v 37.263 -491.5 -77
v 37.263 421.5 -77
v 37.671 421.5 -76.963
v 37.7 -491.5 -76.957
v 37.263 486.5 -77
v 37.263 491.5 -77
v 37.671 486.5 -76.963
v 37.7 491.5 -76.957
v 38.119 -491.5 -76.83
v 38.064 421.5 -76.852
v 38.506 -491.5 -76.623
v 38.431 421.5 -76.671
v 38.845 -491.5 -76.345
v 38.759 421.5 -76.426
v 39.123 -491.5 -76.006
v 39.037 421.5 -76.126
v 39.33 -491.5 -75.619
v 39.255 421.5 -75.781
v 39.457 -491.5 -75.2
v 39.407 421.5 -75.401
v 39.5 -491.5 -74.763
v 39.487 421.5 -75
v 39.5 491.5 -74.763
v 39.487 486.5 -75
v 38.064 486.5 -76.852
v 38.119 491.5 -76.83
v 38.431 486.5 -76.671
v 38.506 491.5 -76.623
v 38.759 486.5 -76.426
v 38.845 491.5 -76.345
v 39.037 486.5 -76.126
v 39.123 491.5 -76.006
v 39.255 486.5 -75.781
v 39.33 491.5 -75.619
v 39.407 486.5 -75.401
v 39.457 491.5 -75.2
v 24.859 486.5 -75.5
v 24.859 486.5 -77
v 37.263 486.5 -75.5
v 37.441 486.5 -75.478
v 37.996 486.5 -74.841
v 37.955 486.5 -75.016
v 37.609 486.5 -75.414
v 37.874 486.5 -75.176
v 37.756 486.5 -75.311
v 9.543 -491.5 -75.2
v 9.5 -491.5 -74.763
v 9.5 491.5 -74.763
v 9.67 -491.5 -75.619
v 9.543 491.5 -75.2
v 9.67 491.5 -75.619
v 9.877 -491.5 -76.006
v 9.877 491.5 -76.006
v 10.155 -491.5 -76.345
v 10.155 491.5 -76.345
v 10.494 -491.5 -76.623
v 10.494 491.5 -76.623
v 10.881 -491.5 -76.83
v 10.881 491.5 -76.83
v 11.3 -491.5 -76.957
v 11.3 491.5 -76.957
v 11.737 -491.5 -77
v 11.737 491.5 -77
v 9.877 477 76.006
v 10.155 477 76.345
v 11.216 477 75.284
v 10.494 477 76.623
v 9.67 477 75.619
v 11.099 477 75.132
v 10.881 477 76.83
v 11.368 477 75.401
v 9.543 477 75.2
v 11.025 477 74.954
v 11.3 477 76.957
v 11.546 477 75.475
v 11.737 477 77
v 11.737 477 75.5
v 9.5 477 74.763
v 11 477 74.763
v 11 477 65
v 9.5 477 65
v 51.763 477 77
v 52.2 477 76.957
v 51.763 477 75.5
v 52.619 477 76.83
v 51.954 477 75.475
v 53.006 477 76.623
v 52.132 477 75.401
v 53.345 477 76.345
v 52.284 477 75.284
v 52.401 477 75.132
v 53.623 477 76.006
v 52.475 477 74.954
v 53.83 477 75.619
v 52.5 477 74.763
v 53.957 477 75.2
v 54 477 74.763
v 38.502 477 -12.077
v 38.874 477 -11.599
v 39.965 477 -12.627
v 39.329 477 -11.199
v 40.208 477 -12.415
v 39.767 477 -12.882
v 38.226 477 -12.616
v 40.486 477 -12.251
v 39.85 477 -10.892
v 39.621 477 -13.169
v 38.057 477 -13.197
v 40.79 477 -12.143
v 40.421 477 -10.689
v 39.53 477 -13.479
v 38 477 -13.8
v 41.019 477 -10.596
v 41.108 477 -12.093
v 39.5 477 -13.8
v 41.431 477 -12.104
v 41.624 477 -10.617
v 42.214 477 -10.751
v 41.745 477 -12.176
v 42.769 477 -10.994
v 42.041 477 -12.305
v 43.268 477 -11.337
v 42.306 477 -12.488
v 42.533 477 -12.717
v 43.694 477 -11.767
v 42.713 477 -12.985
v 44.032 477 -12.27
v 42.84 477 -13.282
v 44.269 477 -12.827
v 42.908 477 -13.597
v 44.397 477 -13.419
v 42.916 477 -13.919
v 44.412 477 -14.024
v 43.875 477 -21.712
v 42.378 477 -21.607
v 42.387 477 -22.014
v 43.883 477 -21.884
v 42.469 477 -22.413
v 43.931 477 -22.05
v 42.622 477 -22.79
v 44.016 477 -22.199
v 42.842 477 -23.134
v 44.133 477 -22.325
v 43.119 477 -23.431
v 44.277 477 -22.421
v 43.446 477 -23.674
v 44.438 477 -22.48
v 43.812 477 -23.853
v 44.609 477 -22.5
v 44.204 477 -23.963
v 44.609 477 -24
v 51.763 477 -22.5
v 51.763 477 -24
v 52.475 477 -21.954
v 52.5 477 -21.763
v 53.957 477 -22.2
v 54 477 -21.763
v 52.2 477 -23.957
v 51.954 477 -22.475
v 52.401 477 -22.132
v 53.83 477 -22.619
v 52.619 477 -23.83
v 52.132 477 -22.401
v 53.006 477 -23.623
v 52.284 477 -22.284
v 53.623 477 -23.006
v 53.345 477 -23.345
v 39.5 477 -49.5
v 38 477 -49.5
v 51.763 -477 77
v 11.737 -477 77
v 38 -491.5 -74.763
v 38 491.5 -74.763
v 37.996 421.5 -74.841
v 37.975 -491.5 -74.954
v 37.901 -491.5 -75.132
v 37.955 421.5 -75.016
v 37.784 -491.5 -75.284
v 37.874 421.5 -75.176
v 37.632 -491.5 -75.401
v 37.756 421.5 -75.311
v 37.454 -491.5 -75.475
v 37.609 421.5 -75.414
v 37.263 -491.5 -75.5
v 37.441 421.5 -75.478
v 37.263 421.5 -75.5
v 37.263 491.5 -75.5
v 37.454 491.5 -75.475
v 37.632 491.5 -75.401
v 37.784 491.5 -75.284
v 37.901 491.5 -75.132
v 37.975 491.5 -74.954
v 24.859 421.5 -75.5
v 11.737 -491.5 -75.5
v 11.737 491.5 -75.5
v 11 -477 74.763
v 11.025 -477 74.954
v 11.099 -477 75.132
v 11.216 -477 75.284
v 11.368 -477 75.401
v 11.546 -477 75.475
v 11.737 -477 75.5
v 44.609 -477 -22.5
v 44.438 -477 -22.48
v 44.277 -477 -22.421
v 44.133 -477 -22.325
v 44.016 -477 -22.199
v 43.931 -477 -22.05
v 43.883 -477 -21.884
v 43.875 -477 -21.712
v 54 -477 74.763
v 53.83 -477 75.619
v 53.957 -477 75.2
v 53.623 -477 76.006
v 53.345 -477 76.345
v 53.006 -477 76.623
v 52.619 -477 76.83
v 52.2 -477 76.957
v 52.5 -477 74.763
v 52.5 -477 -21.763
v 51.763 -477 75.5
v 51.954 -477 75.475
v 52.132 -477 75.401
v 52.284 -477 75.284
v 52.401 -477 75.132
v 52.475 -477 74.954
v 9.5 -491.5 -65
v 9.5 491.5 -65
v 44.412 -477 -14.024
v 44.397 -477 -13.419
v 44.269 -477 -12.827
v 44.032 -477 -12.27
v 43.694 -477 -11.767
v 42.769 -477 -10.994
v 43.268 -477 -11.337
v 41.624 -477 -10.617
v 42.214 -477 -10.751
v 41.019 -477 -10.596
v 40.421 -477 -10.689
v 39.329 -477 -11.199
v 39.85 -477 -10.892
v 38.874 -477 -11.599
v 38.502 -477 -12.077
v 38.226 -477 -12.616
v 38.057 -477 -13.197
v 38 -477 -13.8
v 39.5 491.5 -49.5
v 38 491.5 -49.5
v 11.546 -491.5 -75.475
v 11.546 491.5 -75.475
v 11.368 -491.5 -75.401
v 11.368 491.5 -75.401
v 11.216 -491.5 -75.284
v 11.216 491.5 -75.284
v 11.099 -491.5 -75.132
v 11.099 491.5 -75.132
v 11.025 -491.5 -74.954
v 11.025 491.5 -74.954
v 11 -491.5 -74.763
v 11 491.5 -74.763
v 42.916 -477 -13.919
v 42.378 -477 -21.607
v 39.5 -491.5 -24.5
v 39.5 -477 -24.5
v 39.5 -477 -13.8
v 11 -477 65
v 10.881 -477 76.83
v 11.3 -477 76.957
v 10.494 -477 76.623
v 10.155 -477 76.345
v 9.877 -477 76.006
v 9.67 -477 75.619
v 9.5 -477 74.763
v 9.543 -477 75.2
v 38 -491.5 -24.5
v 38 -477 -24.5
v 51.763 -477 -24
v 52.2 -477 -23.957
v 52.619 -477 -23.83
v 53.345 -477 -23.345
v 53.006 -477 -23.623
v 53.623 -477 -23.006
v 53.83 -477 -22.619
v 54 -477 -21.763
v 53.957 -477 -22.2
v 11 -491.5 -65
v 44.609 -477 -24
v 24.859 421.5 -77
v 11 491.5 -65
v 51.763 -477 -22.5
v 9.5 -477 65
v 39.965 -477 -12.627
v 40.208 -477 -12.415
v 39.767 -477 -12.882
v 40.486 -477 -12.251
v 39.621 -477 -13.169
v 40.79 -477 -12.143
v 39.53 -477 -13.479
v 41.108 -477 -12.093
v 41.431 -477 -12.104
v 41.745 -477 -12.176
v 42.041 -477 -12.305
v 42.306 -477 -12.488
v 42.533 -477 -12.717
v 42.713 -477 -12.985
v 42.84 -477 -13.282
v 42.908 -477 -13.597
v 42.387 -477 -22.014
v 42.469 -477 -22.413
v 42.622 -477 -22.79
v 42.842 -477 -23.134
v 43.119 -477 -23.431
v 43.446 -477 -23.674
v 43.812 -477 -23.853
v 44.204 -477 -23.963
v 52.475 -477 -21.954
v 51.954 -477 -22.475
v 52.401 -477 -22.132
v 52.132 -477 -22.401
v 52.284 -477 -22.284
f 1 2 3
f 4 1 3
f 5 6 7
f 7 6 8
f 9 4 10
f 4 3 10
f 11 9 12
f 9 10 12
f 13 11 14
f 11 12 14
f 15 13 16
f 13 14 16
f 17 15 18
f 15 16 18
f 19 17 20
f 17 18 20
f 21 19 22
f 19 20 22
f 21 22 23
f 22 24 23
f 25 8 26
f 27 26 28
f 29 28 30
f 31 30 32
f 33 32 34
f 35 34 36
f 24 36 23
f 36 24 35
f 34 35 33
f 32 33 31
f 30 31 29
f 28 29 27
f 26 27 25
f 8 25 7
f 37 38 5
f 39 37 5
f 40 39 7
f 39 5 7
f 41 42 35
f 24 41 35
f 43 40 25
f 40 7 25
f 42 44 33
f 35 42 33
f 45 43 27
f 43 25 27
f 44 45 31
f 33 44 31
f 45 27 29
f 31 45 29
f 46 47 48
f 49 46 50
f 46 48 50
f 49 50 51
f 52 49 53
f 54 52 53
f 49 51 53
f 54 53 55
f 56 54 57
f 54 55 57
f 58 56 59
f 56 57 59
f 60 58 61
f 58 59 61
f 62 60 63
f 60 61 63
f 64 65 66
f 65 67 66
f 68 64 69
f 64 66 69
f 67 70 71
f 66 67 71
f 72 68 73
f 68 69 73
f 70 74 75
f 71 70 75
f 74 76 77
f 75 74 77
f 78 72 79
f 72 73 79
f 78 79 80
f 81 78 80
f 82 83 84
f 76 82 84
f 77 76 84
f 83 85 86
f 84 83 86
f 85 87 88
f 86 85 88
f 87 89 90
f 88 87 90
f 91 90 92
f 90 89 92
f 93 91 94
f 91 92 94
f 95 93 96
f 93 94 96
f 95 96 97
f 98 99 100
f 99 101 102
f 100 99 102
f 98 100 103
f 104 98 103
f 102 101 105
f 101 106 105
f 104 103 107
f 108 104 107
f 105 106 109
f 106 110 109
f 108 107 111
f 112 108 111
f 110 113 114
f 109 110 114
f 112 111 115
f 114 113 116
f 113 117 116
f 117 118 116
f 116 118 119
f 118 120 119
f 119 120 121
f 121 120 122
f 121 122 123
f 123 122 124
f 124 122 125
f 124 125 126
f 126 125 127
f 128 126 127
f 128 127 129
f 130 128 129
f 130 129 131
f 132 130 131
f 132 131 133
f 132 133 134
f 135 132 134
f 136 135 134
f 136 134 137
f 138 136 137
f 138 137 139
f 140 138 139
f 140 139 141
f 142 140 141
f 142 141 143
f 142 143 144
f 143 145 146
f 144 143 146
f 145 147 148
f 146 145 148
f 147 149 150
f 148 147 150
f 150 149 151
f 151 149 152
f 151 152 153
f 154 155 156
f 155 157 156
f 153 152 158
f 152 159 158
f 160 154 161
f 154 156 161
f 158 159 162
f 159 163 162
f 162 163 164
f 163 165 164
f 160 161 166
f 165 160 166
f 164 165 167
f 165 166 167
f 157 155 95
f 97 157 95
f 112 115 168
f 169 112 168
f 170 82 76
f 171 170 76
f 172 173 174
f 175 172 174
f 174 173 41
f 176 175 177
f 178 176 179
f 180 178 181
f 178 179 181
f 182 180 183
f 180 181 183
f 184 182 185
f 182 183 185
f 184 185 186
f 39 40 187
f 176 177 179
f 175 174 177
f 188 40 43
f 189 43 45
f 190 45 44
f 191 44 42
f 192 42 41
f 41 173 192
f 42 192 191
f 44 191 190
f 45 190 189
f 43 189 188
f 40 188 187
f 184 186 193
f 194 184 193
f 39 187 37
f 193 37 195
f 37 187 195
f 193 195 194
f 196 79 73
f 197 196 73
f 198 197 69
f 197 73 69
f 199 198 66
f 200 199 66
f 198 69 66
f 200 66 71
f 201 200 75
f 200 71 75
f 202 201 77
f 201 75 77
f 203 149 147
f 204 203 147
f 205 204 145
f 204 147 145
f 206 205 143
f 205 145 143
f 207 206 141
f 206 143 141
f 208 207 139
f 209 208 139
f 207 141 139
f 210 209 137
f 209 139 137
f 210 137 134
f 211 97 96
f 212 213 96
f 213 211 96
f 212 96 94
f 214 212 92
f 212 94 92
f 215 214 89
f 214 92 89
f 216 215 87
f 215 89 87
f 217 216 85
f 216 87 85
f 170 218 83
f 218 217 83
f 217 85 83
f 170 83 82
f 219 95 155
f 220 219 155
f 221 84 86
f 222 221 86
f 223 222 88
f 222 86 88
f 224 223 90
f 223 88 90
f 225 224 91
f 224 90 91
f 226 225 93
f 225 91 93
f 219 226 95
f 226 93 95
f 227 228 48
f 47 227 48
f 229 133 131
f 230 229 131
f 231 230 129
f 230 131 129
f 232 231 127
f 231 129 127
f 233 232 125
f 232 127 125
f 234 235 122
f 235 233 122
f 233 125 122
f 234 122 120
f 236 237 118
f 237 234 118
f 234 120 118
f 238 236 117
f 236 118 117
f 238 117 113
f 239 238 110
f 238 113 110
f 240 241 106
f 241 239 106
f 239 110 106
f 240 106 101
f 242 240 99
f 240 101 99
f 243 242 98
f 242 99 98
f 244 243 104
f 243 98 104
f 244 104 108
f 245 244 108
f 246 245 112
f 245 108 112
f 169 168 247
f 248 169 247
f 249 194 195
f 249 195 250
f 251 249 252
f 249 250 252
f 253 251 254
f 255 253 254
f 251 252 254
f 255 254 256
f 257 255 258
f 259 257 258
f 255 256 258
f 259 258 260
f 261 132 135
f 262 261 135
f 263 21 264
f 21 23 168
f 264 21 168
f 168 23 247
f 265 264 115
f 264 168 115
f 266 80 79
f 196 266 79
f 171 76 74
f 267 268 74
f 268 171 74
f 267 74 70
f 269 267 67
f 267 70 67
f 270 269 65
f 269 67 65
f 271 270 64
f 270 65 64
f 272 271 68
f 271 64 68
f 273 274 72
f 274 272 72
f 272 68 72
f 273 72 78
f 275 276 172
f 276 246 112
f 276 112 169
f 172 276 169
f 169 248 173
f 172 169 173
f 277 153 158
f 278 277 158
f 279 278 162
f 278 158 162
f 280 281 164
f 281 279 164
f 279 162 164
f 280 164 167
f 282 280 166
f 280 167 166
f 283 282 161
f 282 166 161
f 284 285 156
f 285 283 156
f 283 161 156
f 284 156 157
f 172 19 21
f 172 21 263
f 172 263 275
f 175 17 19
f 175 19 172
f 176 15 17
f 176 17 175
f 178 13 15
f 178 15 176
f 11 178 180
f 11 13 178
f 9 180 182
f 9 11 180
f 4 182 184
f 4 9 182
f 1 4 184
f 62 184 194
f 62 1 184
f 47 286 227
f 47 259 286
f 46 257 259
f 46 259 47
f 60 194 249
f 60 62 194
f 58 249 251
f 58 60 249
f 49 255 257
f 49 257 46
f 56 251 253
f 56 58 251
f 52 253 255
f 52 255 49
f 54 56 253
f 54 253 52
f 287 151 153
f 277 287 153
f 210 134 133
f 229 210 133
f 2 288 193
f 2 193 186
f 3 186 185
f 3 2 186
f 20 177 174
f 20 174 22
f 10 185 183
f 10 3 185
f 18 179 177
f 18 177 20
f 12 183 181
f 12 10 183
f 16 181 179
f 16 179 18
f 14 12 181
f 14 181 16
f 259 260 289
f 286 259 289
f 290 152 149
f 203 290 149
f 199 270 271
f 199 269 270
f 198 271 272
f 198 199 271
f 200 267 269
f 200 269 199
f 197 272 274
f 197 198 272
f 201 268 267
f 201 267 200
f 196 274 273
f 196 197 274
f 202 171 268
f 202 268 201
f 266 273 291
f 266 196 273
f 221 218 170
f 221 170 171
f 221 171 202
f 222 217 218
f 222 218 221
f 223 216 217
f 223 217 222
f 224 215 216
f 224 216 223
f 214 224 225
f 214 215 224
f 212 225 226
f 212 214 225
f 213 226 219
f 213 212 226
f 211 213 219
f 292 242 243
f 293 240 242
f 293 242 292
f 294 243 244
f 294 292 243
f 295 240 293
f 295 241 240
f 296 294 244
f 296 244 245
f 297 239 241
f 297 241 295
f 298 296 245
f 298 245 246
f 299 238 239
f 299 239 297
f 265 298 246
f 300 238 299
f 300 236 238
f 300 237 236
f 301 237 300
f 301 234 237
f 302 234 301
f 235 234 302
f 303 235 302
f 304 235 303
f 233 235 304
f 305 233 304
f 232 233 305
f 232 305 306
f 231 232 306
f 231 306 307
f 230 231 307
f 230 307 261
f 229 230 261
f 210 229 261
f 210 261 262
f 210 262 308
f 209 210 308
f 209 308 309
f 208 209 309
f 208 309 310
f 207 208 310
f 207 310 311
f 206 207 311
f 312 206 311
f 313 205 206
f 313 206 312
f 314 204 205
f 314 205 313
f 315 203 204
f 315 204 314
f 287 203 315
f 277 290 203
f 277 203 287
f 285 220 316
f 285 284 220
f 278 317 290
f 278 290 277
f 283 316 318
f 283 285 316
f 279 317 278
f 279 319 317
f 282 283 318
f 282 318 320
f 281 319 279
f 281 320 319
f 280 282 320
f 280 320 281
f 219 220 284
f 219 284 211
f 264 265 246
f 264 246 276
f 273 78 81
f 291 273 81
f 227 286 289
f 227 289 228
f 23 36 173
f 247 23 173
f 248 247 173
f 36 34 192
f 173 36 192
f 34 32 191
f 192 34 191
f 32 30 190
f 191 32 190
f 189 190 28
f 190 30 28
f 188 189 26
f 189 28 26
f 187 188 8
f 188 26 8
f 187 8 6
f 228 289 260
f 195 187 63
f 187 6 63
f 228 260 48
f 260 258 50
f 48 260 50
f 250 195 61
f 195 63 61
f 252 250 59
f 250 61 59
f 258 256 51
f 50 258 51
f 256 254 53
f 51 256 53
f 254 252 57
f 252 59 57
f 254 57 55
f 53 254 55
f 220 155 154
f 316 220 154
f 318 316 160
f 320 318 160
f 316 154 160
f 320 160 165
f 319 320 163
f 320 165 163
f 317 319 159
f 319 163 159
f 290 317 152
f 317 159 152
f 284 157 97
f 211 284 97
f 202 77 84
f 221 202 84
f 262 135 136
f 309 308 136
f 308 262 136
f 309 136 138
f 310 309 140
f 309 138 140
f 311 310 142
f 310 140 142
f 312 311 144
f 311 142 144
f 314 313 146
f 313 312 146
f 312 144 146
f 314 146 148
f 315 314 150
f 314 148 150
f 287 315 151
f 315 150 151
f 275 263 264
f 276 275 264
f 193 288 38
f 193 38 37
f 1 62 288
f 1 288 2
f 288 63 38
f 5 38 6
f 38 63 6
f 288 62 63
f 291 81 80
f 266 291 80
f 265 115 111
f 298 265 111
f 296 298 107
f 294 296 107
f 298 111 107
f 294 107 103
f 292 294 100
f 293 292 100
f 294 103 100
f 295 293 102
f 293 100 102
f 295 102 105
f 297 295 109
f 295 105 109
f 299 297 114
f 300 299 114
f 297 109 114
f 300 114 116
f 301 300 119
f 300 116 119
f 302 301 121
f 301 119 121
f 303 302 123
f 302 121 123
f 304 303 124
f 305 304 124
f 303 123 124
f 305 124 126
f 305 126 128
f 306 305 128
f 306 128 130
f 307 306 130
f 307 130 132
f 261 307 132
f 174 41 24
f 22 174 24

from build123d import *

# Parameters (mm, degrees)
BASE_FLANGE1_DEPTH = 491.5
SKETCH3_W          = 127.454139471
SKETCH3_H          = 14.5
SKETCH3_W_2        = 136.466577612
CUT_EXTRUDE3_DEPTH = 500.481230879
CUT_EXTRUDE5_START = 421.5
CUT_EXTRUDE5_DEPTH = 65


# Read off the part's stored shape, not the designer's step: Cut-Extrude5
# Sheet-metal steps are written as plain solids
with BuildPart() as part:
    # Sketch1 → Base-Flange1 (new, symmetric)
    with BuildSketch(Plane(origin=(0, 0, 0), x_dir=(1, 0, 0), z_dir=(0, 1, 0))):
        with BuildLine():
            Line((9.5, 65), (9.5, 74.7634))
            ThreePointArc((9.5, 74.7634), (10.155084973, 76.344915027), (11.7366, 77))
            Line((11.7366, 77), (37.2634, 77))
            ThreePointArc((37.2634, 77), (38.844915027, 76.344915027), (39.5, 74.7634))
            Line((39.5, 74.7634), (39.5, 30))
            Line((39.5, 30), (39.5, 24))
            Line((39.5, 24), (39.5, 13.8))
            ThreePointArc((39.5, 13.8), (41.269678139, 12.091041686), (42.915834526, 13.91928357))
            Line((42.915834526, 13.91928357), (42.378230266, 21.607382671))
            ThreePointArc((42.378230266, 21.607382671), (42.973636332, 23.288757532), (44.609382021, 24))
            Line((44.609382021, 24), (51.7634, 24))
            ThreePointArc((51.7634, 24), (53.344915027, 23.344915027), (54, 21.7634))
            Line((54, 21.7634), (54, -30))
            Line((54, -30), (54, -74.7634))
            ThreePointArc((54, -74.7634), (53.344915027, -76.344915027), (51.7634, -77))
            Line((51.7634, -77), (39.5, -77))
            Line((39.5, -77), (11.7366, -77))
            ThreePointArc((11.7366, -77), (10.155084973, -76.344915027), (9.5, -74.7634))
            Line((9.5, -74.7634), (9.5, -65))
            Line((9.5, -65), (11, -65))
            Line((11, -65), (11, -74.7634))
            ThreePointArc((11, -74.7634), (11.215745145, -75.284254855), (11.7366, -75.5))
            Line((11.7366, -75.5), (39.5, -75.5))
            Line((39.5, -75.5), (51.7634, -75.5))
            ThreePointArc((51.7634, -75.5), (52.284254855, -75.284254855), (52.5, -74.7634))
            Line((52.5, -74.7634), (52.5, -30))
            Line((52.5, -30), (52.5, 21.7634))
            ThreePointArc((52.5, 21.7634), (52.284254855, 22.284254855), (51.7634, 22.5))
            Line((51.7634, 22.5), (44.609382021, 22.5))
            ThreePointArc((44.609382021, 22.5), (44.070666884, 22.265759992), (43.874576341, 21.712017381))
            Line((43.874576341, 21.712017381), (44.412180601, 14.023918281))
            ThreePointArc((44.412180601, 14.023918281), (41.322027384, 10.591955445), (38, 13.8))
            Line((38, 13.8), (38, 24))
            Line((38, 24), (38, 30))
            Line((38, 30), (38, 74.7634))
            ThreePointArc((38, 74.7634), (37.784254855, 75.284254855), (37.2634, 75.5))
            Line((37.2634, 75.5), (11.7366, 75.5))
            ThreePointArc((11.7366, 75.5), (11.215745145, 75.284254855), (11, 74.7634))
            Line((11, 74.7634), (11, 65))
            Line((11, 65), (9.5, 65))
        make_face()
    extrude(amount=BASE_FLANGE1_DEPTH, both=True)

    # Sketch3 → Cut-Extrude3 (cut, through all)
    with BuildSketch(Plane(origin=(54, 0, 0), x_dir=(0, 0, -1), z_dir=(1, 0, 0))):
        with Locations((-39.227069736, -484.25)):
            Rectangle(SKETCH3_W, SKETCH3_H)
        with Locations((-18.733288806, 484.25)):
            Rectangle(SKETCH3_W_2, SKETCH3_H)
    extrude(amount=-CUT_EXTRUDE3_DEPTH, mode=Mode.SUBTRACT)

    # Cut-Extrude5 outline → Cut-Extrude5 (cut)
    with BuildSketch(Plane(origin=(0, 0, 0), x_dir=(1, 0, 0), z_dir=(0, 1, 0)).offset(CUT_EXTRUDE5_START)):
        with BuildLine():
            Line((37.2634, 77), (24.859115026, 77))
            Line((24.859115026, 77), (24.859115026, 75.5))
            Line((24.859115026, 75.5), (37.2634, 75.5))
            ThreePointArc((37.2634, 75.5), (37.755935518, 75.311111898), (37.995866912, 74.841321649))
            Line((37.995866912, 74.841321649), (39.487450359, 75))
            ThreePointArc((39.487450359, 75), (38.758926663, 76.426463306), (37.2634, 77))
        make_face()
    extrude(amount=CUT_EXTRUDE5_DEPTH, mode=Mode.SUBTRACT)


solid = part.part
